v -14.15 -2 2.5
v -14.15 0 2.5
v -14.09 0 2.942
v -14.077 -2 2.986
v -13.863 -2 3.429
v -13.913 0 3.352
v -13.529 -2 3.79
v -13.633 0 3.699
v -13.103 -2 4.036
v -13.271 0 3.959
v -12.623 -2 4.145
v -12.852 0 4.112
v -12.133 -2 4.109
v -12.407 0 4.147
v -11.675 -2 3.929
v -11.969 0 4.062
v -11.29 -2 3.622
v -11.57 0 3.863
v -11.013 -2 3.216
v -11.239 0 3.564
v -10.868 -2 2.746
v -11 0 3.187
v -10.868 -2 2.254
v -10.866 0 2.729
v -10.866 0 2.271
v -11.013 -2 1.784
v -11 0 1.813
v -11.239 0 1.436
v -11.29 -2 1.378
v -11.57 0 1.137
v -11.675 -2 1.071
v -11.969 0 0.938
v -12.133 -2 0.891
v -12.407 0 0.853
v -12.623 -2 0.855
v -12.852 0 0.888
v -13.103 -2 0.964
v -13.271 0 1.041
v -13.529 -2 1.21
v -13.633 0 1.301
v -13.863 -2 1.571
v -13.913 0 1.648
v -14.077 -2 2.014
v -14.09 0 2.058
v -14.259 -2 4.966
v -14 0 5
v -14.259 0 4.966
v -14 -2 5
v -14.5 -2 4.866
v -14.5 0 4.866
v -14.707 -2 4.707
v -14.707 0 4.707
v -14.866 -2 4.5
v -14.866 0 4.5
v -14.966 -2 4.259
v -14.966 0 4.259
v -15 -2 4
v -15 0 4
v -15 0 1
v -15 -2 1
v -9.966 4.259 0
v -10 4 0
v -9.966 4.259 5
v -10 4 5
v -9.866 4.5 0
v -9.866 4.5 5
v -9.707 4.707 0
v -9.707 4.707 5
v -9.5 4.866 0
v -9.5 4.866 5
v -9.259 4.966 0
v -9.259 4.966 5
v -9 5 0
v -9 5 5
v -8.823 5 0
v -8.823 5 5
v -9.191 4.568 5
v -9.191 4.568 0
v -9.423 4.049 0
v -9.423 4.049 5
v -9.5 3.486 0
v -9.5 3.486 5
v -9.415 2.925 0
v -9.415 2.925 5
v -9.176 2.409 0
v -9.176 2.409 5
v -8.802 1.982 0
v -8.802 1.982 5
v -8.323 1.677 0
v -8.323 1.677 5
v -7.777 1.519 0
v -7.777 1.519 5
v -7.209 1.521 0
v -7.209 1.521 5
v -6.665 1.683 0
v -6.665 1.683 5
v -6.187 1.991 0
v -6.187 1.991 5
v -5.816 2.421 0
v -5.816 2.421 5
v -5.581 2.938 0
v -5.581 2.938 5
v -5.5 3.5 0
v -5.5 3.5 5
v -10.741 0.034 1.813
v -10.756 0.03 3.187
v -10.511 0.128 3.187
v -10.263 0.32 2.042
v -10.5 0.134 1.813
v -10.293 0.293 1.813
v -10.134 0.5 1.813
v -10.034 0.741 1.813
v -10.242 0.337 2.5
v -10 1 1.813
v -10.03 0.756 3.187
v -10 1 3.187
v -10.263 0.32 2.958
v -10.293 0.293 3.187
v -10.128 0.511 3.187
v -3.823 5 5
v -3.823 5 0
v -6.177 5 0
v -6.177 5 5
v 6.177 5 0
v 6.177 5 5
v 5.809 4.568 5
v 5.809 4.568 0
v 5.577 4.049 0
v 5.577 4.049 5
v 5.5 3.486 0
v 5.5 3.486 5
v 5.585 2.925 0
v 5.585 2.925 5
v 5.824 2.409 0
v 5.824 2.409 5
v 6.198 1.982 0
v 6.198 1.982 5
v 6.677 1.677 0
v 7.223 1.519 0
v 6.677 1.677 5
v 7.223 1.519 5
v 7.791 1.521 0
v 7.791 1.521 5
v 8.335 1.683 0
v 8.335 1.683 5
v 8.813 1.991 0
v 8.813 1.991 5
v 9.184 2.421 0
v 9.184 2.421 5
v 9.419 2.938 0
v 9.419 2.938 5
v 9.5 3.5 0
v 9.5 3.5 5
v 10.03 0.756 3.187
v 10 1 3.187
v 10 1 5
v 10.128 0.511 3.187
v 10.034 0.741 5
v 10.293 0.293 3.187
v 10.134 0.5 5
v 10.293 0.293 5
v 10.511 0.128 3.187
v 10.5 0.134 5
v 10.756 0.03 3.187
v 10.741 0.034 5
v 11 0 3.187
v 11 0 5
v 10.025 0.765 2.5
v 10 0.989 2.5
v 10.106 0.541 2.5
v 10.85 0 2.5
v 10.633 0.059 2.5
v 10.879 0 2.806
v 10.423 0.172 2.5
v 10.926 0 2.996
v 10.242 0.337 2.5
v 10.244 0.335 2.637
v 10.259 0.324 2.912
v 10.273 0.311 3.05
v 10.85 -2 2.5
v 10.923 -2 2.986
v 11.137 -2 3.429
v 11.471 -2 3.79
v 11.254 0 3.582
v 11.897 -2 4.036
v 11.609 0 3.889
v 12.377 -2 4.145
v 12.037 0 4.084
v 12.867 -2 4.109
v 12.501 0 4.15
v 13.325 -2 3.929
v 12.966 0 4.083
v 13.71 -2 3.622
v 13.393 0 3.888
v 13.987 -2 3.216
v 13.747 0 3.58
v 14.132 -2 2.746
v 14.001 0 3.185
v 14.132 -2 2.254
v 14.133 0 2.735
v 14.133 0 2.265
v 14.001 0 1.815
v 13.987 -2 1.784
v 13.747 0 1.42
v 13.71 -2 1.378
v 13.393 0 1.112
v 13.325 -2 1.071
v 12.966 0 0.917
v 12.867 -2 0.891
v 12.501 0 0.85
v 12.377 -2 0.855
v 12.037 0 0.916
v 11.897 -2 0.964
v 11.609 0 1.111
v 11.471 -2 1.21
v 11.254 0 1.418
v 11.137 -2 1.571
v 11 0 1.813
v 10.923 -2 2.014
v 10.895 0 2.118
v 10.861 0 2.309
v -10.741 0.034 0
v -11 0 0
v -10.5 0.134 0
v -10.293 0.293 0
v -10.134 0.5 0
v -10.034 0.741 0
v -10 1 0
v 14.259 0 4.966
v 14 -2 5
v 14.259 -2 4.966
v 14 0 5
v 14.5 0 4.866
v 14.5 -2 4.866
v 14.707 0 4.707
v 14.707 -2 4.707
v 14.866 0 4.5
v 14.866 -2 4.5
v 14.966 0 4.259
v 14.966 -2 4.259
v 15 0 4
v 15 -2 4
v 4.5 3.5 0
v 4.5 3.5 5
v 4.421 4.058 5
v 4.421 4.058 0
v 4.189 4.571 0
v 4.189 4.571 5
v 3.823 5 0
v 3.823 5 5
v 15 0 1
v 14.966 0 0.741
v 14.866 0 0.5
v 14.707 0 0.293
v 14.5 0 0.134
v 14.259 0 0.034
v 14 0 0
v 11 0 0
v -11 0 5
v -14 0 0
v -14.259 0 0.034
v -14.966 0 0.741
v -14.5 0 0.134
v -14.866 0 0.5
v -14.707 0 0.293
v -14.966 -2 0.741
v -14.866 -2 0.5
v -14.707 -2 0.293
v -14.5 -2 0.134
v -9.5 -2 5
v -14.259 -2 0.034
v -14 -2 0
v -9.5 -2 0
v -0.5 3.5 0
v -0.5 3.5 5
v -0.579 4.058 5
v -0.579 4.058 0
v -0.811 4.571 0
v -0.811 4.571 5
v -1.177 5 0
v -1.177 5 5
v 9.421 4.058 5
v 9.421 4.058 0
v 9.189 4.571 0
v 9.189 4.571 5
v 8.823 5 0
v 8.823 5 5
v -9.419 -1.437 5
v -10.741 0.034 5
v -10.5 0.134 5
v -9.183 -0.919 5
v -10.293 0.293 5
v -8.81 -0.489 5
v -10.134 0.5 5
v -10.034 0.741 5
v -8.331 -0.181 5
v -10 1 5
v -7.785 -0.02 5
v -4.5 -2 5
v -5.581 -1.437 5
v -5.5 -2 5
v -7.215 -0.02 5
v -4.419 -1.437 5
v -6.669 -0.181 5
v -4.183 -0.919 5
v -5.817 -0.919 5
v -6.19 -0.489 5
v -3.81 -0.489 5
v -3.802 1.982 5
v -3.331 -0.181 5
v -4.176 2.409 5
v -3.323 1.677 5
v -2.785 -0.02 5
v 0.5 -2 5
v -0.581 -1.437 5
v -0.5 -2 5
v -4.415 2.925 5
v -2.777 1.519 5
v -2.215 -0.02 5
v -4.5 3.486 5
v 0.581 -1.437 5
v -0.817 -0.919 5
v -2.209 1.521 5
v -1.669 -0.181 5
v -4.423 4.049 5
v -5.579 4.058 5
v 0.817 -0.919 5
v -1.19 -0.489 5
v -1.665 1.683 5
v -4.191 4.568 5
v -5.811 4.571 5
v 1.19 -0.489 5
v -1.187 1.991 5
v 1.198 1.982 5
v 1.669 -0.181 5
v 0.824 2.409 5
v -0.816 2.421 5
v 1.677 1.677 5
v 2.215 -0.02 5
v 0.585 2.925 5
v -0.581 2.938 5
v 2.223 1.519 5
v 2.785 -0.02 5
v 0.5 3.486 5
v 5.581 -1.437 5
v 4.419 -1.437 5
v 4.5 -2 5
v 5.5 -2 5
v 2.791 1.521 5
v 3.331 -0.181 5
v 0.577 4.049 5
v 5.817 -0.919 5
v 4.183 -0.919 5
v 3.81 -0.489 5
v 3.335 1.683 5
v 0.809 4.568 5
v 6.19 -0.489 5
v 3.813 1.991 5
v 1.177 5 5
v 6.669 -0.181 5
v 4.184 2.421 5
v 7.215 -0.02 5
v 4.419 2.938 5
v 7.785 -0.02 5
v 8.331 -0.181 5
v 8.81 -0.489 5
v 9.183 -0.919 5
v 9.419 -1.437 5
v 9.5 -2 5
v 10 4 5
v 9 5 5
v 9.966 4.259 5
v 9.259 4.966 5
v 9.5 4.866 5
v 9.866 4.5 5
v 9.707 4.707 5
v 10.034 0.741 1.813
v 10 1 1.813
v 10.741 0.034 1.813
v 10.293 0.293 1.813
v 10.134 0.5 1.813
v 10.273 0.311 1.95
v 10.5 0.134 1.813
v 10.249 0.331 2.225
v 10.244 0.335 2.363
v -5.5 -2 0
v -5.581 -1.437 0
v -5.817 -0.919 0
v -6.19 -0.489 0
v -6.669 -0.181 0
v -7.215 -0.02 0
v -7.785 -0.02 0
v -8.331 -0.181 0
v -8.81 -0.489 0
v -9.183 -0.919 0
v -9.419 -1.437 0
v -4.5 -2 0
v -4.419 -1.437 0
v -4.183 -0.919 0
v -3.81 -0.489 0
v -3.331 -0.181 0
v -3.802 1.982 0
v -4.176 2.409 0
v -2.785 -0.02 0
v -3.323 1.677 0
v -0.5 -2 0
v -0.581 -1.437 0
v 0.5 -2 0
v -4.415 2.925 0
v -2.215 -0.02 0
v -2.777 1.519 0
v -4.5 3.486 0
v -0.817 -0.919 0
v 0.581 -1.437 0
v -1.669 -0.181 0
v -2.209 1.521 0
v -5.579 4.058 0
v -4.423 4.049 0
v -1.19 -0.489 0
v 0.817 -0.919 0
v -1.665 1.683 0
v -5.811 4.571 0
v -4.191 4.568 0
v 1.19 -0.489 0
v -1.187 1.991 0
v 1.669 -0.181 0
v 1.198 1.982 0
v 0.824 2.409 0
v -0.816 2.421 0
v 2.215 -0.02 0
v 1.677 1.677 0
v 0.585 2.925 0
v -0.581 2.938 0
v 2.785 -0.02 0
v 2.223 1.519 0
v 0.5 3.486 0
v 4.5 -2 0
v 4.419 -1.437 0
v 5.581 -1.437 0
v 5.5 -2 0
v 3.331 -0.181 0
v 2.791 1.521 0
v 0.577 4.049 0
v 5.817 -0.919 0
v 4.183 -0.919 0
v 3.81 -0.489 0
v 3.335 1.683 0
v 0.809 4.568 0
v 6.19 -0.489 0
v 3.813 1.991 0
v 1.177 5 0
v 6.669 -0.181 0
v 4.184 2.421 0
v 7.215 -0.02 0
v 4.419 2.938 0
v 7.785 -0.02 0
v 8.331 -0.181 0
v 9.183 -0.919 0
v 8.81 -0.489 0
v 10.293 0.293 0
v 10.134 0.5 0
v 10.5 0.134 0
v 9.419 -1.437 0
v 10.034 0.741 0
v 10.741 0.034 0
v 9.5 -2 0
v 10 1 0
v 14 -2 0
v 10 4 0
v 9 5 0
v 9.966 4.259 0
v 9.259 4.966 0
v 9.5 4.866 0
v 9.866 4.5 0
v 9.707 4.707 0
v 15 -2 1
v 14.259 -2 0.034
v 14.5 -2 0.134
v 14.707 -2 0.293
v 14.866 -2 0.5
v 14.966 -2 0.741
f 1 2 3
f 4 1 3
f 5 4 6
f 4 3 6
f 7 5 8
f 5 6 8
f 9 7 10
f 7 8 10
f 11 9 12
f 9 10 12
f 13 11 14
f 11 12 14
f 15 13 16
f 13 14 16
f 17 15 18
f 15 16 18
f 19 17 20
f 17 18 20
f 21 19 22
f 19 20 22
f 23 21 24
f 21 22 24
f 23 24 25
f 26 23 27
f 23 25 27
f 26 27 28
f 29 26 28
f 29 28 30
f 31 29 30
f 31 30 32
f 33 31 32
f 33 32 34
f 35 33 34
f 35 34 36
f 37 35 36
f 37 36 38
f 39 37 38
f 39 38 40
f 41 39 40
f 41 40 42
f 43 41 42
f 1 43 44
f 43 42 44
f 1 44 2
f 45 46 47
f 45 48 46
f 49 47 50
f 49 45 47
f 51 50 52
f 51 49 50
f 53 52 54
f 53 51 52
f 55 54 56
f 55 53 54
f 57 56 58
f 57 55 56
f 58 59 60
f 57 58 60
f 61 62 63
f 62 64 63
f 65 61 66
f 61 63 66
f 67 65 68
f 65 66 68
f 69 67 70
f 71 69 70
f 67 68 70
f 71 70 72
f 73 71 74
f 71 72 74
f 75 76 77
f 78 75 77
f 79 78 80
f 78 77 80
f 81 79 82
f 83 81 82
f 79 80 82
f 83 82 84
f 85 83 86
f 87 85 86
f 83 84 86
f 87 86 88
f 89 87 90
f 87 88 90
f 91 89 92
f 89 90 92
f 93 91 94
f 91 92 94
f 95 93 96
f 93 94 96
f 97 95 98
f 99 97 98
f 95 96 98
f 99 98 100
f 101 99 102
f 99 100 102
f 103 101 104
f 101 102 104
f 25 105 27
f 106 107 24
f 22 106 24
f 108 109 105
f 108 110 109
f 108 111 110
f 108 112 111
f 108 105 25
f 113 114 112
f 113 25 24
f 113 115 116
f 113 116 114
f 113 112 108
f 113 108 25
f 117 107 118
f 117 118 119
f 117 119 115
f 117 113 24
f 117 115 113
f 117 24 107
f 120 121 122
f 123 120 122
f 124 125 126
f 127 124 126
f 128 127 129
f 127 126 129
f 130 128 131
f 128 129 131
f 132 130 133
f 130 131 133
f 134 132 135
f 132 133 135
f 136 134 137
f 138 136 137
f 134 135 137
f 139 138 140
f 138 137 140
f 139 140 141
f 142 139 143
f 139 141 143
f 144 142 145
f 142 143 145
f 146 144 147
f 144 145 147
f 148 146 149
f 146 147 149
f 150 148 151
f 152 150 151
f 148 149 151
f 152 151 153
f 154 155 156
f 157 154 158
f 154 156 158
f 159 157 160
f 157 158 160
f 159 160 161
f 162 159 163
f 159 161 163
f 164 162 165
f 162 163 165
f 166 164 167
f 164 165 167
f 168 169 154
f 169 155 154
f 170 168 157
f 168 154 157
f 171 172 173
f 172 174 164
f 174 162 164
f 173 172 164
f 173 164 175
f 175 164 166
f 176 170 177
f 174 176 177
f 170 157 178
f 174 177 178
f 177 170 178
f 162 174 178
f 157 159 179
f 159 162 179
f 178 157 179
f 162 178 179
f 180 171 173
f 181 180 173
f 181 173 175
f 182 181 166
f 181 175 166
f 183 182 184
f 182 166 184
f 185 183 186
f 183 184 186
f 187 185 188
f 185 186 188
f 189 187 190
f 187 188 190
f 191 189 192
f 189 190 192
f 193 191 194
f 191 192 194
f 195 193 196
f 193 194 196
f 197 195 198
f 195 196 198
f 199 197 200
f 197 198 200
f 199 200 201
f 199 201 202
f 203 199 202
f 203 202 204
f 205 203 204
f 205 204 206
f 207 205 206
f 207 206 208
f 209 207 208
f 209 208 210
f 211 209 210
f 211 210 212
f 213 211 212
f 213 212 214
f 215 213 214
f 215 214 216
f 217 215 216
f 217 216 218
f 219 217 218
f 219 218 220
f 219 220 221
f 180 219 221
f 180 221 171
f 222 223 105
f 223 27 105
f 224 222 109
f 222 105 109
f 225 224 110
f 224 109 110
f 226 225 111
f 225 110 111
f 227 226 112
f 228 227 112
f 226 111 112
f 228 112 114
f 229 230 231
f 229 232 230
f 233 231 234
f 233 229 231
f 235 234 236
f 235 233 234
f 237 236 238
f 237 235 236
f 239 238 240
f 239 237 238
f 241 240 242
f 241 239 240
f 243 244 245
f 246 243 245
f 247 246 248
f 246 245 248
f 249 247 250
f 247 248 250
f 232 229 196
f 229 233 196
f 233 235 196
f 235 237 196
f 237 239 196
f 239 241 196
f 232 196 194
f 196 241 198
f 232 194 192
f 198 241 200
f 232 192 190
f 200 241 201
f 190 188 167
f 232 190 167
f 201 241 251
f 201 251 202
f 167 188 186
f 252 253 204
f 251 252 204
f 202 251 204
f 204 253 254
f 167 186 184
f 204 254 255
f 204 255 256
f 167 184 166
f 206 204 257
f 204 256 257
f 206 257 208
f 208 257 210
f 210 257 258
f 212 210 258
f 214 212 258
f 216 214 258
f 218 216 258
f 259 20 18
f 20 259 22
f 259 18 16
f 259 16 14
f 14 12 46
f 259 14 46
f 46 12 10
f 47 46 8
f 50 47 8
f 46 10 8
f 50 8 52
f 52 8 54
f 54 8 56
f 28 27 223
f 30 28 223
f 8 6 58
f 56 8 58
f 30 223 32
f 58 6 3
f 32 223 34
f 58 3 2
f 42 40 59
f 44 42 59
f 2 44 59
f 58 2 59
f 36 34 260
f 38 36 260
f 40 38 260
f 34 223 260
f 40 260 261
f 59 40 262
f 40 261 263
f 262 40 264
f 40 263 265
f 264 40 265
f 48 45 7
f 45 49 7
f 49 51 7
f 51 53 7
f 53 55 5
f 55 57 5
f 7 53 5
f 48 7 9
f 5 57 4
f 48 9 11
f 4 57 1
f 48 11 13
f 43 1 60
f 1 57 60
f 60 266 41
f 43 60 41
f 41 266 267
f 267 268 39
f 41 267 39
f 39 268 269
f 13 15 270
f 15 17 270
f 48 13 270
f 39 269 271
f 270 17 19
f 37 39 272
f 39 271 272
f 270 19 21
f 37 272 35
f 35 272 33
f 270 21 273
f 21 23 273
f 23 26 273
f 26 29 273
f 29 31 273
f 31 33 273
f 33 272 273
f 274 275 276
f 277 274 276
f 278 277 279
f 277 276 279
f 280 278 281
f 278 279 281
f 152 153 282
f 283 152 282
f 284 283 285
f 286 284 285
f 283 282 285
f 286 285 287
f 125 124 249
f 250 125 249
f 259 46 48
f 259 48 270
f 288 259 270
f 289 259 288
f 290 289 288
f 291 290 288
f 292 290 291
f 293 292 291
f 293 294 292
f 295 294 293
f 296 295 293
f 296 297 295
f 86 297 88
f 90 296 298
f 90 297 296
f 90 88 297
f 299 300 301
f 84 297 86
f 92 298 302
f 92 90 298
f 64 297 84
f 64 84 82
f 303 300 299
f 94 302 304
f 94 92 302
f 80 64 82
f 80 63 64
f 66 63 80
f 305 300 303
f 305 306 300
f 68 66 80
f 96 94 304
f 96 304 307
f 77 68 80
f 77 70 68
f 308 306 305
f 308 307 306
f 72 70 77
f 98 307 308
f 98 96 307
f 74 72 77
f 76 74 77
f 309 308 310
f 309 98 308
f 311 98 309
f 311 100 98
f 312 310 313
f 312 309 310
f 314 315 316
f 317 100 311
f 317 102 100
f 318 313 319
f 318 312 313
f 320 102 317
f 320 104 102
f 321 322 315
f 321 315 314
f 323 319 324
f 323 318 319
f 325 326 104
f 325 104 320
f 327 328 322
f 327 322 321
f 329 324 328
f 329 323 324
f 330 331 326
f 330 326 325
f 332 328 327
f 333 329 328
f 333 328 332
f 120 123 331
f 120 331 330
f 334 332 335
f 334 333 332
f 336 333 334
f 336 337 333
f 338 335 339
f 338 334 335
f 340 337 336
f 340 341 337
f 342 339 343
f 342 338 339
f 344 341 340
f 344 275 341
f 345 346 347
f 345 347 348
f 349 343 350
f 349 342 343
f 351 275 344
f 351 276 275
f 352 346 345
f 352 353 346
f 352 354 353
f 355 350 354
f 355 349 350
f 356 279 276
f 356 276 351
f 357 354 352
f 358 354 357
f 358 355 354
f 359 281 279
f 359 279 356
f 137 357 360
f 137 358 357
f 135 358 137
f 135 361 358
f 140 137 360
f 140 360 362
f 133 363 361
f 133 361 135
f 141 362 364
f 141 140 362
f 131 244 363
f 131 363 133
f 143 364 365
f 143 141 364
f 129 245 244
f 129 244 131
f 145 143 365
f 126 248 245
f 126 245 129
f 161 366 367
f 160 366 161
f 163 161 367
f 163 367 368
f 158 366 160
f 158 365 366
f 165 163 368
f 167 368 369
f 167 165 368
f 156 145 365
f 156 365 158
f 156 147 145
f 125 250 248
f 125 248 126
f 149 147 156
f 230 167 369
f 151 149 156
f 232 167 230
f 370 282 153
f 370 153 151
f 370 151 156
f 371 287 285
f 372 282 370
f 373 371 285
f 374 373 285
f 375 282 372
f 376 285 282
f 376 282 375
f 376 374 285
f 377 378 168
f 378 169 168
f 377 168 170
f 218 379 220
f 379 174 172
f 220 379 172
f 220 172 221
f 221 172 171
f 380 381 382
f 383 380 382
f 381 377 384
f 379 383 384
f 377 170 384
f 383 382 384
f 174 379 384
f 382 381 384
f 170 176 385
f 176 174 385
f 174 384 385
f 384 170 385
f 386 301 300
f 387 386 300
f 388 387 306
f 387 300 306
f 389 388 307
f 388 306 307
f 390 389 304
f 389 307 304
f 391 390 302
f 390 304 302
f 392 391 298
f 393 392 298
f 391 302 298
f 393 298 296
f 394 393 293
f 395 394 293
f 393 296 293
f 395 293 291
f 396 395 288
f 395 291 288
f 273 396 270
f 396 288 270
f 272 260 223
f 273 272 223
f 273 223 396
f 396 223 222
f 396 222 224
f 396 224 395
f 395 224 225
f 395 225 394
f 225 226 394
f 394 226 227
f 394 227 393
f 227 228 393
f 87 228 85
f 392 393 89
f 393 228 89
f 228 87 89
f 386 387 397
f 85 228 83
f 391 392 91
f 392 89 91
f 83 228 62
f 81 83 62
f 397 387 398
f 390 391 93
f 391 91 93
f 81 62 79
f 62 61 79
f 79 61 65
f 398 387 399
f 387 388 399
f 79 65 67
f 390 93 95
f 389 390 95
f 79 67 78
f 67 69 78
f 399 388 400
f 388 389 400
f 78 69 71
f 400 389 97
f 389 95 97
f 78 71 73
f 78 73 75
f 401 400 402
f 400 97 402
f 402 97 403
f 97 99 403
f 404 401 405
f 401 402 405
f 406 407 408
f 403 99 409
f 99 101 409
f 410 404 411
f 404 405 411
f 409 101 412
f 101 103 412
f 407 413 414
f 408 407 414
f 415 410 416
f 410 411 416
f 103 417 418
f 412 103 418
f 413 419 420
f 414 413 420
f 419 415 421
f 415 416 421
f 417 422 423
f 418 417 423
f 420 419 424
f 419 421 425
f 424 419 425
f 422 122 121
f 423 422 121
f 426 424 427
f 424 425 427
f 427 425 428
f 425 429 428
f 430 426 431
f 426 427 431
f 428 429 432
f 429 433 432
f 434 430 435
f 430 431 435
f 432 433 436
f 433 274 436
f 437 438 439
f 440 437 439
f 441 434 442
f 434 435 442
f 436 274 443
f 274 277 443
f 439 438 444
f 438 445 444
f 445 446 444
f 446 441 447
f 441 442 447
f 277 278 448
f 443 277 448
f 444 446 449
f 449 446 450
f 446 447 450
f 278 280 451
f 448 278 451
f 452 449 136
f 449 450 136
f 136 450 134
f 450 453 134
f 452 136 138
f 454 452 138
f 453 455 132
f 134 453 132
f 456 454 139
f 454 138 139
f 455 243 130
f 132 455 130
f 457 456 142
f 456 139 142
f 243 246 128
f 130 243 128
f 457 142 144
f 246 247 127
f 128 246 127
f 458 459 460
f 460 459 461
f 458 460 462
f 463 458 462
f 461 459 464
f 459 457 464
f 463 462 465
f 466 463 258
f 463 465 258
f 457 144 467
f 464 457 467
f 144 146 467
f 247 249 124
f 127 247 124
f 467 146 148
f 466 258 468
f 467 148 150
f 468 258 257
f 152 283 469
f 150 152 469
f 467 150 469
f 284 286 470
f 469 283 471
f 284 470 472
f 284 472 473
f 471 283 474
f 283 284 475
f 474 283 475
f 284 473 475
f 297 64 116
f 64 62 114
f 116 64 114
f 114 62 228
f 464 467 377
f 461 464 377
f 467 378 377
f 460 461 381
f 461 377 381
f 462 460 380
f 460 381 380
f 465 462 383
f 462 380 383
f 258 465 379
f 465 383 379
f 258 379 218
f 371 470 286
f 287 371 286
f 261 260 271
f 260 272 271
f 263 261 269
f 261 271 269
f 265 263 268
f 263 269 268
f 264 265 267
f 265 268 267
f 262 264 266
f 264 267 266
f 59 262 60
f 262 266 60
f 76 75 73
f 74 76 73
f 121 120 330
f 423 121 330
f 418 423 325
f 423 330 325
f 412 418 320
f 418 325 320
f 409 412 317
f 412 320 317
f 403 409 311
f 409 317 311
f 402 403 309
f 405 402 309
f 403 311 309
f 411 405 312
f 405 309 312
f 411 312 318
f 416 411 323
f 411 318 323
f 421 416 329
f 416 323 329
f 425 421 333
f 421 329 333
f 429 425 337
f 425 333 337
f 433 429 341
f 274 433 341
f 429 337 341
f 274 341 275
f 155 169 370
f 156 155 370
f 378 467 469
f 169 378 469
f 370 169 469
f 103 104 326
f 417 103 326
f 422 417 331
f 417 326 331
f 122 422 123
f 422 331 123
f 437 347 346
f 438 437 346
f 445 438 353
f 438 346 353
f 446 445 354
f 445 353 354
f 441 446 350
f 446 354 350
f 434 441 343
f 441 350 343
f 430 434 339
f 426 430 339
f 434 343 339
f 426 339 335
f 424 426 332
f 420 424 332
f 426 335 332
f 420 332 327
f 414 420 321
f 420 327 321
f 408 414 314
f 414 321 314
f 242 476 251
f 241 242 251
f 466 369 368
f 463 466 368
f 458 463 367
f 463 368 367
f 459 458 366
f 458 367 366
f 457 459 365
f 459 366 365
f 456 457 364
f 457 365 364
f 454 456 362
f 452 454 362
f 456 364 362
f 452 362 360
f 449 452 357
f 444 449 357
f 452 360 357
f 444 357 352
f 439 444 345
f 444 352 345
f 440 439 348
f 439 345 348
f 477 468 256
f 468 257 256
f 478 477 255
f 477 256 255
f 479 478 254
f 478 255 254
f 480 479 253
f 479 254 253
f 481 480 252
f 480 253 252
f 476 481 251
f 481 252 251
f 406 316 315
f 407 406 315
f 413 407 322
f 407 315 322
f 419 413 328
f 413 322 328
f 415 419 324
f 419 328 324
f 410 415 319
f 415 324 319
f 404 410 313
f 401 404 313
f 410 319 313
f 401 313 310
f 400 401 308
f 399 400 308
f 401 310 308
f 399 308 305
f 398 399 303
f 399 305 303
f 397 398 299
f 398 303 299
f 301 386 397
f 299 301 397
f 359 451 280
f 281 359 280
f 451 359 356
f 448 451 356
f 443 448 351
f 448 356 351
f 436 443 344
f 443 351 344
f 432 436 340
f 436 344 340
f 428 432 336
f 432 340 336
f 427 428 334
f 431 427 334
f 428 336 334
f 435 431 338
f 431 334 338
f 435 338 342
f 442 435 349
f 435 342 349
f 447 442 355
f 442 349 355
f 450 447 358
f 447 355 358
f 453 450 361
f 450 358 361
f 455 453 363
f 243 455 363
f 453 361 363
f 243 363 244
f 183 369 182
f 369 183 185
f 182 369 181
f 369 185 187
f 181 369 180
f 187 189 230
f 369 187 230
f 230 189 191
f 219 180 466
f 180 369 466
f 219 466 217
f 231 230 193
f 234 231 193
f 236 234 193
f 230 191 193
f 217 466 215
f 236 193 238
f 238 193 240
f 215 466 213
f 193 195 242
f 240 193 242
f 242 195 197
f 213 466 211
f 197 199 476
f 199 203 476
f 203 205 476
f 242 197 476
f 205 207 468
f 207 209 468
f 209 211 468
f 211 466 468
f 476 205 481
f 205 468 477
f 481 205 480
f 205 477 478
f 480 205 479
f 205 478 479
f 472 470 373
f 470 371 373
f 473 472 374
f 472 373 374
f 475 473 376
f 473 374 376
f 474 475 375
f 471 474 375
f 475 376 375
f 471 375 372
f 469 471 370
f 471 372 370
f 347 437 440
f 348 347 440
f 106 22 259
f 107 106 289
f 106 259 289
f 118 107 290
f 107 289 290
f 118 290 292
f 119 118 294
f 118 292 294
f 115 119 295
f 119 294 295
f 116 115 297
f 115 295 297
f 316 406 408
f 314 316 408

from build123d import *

# Parameters (mm, degrees)
F1_DEPTH = 5
F2_R     = 1.65
F3_DEPTH = 2.001
F5_DEPTH = 5
F6_R     = 1


with BuildPart() as f1:
    # F0 (on Top) → F1 (new body)
    with BuildSketch(Plane.XY):
        Polygon((10, 5), (-10, 5), (-10, 0), (-15, 0), (-15, -2), (-10, -2), (10, -2), (15, -2), (15, 0), (10, 0), align=None)
    extrude(amount=F1_DEPTH)

    # F2 (on face) → F3 (cut, through all)
    with BuildSketch(Plane(origin=(0, 0, 0), x_dir=(-1, 0, 0), z_dir=(0, 1, 0))):
        with Locations((-12.5, 2.5)):
            Circle(F2_R)
        with Locations((12.5, 2.5)):
            Circle(F2_R)
    extrude(amount=-F3_DEPTH, mode=Mode.SUBTRACT)

    # F4 (on face) → F5 (cut, through all)
    with BuildSketch(Plane.XY.offset(5)):
        with BuildLine():
            Line((-9.5, -2), (-5.5, -2))
            ThreePointArc((-5.5, -2), (-7.5, 0), (-9.5, -2))
        make_face()
        with BuildLine():
            ThreePointArc((-0.5, -2), (-2.5, 0), (-4.5, -2))
            Line((-4.5, -2), (-0.5, -2))
        make_face()
        with BuildLine():
            ThreePointArc((4.5, -2), (2.5, 0), (0.5, -2))
            Line((0.5, -2), (4.5, -2))
        make_face()
        with BuildLine():
            ThreePointArc((9.5, -2), (7.5, 0), (5.5, -2))
            Line((5.5, -2), (9.5, -2))
        make_face()
        with BuildLine():
            ThreePointArc((-6.177124, 5), (-7.5, 5.5), (-8.822876, 5))
            Line((-8.822876, 5), (-6.177124, 5))
        make_face()
        with BuildLine():
            ThreePointArc((-1.177124, 5), (-2.5, 5.5), (-3.822876, 5))
            Line((-3.822876, 5), (-1.177124, 5))
        make_face()
        with BuildLine():
            Line((3.822876, 5), (1.177124, 5))
            ThreePointArc((1.177124, 5), (1.677124, 1.677124), (4.5, 3.5))
            ThreePointArc((4.5, 3.5), (4.322876, 4.322876), (3.822876, 5))
        make_face()
        with BuildLine():
            ThreePointArc((9.5, 3.5), (9.322876, 4.322876), (8.822876, 5))
            Line((8.822876, 5), (6.177124, 5))
            ThreePointArc((6.177124, 5), (6.677124, 1.677124), (9.5, 3.5))
        make_face()
        with BuildLine():
            Line((-6.177124, 5), (-8.822876, 5))
            ThreePointArc((-8.822876, 5), (-8.322876, 1.677124), (-5.5, 3.5))
            ThreePointArc((-5.5, 3.5), (-5.677124, 4.322876), (-6.177124, 5))
        make_face()
        with BuildLine():
            Line((-1.177124, 5), (-3.822876, 5))
            ThreePointArc((-3.822876, 5), (-3.322876, 1.677124), (-0.5, 3.5))
            ThreePointArc((-0.5, 3.5), (-0.677124, 4.322876), (-1.177124, 5))
        make_face()
        with BuildLine():
            ThreePointArc((3.822876, 5), (2.5, 5.5), (1.177124, 5))
            Line((1.177124, 5), (3.822876, 5))
        make_face()
        with BuildLine():
            Line((6.177124, 5), (8.822876, 5))
            ThreePointArc((8.822876, 5), (7.5, 5.5), (6.177124, 5))
        make_face()
    extrude(amount=-F5_DEPTH, mode=Mode.SUBTRACT)

    # F6
    f6_edges = [f1.edges().sort_by_distance(p)[0] for p in [
        (-10, 0, 2.5),
        (10, 0, 2.5),
        (10, 5, 2.5),
        (-10, 5, 2.5),
        (15, -1, 5),
        (15, -1, 0),
        (-15, -1, 0),
        (-15, -1, 5),
    ]]
    fillet(f6_edges, radius=F6_R)


solid = f1.part
